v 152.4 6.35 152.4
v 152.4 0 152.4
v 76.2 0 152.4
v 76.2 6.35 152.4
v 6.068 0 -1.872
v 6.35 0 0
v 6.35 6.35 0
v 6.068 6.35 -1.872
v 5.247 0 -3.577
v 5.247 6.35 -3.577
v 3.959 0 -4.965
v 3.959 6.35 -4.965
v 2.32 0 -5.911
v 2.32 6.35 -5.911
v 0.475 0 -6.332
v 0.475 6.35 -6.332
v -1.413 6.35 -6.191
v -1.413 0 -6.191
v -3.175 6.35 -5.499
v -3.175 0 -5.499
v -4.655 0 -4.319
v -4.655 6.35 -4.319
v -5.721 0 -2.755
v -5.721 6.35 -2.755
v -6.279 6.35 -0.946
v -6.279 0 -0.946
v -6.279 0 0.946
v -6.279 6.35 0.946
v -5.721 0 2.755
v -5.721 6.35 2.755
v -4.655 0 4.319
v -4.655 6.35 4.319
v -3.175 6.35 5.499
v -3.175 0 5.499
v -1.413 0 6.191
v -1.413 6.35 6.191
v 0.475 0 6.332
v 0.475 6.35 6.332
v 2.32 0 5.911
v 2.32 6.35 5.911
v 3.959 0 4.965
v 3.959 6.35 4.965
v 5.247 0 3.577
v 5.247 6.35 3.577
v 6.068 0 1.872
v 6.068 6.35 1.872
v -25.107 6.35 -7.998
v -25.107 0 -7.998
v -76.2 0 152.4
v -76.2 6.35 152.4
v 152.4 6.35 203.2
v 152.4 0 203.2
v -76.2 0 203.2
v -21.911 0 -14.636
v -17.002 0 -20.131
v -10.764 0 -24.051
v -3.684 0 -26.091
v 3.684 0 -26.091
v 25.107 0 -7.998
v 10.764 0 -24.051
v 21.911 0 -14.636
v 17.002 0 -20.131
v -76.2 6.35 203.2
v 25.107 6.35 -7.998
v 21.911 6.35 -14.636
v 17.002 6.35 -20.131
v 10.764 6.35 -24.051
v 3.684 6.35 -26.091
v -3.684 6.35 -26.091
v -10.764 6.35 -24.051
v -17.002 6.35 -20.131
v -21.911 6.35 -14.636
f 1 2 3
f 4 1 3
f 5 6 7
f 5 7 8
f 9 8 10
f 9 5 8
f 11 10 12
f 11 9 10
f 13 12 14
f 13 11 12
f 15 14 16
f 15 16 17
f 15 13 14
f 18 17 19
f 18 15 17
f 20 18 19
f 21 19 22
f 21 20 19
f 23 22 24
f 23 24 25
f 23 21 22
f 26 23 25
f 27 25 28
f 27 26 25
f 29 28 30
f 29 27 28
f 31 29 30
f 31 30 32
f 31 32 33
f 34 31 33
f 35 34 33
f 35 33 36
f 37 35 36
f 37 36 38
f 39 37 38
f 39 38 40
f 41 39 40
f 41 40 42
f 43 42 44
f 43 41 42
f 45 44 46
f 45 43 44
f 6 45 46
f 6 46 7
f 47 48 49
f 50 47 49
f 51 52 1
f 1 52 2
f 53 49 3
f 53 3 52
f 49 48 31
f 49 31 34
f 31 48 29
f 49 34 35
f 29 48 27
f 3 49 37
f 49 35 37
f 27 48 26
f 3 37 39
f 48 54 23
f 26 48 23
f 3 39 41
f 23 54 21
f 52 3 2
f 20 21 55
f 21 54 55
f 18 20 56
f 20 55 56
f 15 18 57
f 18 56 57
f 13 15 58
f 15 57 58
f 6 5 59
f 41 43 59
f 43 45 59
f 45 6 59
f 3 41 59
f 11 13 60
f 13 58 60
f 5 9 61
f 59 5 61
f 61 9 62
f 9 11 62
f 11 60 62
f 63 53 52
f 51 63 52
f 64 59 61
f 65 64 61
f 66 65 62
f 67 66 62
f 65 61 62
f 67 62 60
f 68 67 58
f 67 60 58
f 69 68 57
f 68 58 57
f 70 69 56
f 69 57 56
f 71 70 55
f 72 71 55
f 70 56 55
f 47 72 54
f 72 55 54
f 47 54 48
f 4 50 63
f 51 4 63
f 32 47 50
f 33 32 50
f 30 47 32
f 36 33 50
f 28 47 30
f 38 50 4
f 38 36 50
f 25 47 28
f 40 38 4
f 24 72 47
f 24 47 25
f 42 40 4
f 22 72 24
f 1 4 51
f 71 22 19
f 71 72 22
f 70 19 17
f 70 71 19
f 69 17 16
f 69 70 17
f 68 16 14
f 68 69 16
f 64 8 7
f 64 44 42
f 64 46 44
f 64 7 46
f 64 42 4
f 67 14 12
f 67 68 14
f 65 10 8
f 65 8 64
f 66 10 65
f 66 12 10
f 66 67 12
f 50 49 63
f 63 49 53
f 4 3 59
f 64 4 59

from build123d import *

# Parameters (mm, degrees)
SKETCH1_R           = 6.35
BOSS_EXTRUDE1_DEPTH = 6.35


with BuildPart() as part:
    # Sketch1 → Boss-Extrude1 (new body)
    with BuildSketch(Plane(origin=(0, 0, 0), x_dir=(1, 0, 0), z_dir=(0, 1, 0))):
        with BuildLine():
            Line((76.2, -152.4), (25.106996492, 7.99757633))
            ThreePointArc((25.106996492, 7.99757633), (0, 26.35), (-25.106996492, 7.99757633))
            Line((-25.106996492, 7.99757633), (-76.2, -152.4))
            Line((-76.2, -152.4), (-76.2, -203.2))
            Line((-76.2, -203.2), (152.4, -203.2))
            Line((152.4, -203.2), (152.4, -152.4))
            Line((152.4, -152.4), (76.2, -152.4))
        make_face()
        Circle(SKETCH1_R, mode=Mode.SUBTRACT)
    extrude(amount=BOSS_EXTRUDE1_DEPTH)


solid = part.part
